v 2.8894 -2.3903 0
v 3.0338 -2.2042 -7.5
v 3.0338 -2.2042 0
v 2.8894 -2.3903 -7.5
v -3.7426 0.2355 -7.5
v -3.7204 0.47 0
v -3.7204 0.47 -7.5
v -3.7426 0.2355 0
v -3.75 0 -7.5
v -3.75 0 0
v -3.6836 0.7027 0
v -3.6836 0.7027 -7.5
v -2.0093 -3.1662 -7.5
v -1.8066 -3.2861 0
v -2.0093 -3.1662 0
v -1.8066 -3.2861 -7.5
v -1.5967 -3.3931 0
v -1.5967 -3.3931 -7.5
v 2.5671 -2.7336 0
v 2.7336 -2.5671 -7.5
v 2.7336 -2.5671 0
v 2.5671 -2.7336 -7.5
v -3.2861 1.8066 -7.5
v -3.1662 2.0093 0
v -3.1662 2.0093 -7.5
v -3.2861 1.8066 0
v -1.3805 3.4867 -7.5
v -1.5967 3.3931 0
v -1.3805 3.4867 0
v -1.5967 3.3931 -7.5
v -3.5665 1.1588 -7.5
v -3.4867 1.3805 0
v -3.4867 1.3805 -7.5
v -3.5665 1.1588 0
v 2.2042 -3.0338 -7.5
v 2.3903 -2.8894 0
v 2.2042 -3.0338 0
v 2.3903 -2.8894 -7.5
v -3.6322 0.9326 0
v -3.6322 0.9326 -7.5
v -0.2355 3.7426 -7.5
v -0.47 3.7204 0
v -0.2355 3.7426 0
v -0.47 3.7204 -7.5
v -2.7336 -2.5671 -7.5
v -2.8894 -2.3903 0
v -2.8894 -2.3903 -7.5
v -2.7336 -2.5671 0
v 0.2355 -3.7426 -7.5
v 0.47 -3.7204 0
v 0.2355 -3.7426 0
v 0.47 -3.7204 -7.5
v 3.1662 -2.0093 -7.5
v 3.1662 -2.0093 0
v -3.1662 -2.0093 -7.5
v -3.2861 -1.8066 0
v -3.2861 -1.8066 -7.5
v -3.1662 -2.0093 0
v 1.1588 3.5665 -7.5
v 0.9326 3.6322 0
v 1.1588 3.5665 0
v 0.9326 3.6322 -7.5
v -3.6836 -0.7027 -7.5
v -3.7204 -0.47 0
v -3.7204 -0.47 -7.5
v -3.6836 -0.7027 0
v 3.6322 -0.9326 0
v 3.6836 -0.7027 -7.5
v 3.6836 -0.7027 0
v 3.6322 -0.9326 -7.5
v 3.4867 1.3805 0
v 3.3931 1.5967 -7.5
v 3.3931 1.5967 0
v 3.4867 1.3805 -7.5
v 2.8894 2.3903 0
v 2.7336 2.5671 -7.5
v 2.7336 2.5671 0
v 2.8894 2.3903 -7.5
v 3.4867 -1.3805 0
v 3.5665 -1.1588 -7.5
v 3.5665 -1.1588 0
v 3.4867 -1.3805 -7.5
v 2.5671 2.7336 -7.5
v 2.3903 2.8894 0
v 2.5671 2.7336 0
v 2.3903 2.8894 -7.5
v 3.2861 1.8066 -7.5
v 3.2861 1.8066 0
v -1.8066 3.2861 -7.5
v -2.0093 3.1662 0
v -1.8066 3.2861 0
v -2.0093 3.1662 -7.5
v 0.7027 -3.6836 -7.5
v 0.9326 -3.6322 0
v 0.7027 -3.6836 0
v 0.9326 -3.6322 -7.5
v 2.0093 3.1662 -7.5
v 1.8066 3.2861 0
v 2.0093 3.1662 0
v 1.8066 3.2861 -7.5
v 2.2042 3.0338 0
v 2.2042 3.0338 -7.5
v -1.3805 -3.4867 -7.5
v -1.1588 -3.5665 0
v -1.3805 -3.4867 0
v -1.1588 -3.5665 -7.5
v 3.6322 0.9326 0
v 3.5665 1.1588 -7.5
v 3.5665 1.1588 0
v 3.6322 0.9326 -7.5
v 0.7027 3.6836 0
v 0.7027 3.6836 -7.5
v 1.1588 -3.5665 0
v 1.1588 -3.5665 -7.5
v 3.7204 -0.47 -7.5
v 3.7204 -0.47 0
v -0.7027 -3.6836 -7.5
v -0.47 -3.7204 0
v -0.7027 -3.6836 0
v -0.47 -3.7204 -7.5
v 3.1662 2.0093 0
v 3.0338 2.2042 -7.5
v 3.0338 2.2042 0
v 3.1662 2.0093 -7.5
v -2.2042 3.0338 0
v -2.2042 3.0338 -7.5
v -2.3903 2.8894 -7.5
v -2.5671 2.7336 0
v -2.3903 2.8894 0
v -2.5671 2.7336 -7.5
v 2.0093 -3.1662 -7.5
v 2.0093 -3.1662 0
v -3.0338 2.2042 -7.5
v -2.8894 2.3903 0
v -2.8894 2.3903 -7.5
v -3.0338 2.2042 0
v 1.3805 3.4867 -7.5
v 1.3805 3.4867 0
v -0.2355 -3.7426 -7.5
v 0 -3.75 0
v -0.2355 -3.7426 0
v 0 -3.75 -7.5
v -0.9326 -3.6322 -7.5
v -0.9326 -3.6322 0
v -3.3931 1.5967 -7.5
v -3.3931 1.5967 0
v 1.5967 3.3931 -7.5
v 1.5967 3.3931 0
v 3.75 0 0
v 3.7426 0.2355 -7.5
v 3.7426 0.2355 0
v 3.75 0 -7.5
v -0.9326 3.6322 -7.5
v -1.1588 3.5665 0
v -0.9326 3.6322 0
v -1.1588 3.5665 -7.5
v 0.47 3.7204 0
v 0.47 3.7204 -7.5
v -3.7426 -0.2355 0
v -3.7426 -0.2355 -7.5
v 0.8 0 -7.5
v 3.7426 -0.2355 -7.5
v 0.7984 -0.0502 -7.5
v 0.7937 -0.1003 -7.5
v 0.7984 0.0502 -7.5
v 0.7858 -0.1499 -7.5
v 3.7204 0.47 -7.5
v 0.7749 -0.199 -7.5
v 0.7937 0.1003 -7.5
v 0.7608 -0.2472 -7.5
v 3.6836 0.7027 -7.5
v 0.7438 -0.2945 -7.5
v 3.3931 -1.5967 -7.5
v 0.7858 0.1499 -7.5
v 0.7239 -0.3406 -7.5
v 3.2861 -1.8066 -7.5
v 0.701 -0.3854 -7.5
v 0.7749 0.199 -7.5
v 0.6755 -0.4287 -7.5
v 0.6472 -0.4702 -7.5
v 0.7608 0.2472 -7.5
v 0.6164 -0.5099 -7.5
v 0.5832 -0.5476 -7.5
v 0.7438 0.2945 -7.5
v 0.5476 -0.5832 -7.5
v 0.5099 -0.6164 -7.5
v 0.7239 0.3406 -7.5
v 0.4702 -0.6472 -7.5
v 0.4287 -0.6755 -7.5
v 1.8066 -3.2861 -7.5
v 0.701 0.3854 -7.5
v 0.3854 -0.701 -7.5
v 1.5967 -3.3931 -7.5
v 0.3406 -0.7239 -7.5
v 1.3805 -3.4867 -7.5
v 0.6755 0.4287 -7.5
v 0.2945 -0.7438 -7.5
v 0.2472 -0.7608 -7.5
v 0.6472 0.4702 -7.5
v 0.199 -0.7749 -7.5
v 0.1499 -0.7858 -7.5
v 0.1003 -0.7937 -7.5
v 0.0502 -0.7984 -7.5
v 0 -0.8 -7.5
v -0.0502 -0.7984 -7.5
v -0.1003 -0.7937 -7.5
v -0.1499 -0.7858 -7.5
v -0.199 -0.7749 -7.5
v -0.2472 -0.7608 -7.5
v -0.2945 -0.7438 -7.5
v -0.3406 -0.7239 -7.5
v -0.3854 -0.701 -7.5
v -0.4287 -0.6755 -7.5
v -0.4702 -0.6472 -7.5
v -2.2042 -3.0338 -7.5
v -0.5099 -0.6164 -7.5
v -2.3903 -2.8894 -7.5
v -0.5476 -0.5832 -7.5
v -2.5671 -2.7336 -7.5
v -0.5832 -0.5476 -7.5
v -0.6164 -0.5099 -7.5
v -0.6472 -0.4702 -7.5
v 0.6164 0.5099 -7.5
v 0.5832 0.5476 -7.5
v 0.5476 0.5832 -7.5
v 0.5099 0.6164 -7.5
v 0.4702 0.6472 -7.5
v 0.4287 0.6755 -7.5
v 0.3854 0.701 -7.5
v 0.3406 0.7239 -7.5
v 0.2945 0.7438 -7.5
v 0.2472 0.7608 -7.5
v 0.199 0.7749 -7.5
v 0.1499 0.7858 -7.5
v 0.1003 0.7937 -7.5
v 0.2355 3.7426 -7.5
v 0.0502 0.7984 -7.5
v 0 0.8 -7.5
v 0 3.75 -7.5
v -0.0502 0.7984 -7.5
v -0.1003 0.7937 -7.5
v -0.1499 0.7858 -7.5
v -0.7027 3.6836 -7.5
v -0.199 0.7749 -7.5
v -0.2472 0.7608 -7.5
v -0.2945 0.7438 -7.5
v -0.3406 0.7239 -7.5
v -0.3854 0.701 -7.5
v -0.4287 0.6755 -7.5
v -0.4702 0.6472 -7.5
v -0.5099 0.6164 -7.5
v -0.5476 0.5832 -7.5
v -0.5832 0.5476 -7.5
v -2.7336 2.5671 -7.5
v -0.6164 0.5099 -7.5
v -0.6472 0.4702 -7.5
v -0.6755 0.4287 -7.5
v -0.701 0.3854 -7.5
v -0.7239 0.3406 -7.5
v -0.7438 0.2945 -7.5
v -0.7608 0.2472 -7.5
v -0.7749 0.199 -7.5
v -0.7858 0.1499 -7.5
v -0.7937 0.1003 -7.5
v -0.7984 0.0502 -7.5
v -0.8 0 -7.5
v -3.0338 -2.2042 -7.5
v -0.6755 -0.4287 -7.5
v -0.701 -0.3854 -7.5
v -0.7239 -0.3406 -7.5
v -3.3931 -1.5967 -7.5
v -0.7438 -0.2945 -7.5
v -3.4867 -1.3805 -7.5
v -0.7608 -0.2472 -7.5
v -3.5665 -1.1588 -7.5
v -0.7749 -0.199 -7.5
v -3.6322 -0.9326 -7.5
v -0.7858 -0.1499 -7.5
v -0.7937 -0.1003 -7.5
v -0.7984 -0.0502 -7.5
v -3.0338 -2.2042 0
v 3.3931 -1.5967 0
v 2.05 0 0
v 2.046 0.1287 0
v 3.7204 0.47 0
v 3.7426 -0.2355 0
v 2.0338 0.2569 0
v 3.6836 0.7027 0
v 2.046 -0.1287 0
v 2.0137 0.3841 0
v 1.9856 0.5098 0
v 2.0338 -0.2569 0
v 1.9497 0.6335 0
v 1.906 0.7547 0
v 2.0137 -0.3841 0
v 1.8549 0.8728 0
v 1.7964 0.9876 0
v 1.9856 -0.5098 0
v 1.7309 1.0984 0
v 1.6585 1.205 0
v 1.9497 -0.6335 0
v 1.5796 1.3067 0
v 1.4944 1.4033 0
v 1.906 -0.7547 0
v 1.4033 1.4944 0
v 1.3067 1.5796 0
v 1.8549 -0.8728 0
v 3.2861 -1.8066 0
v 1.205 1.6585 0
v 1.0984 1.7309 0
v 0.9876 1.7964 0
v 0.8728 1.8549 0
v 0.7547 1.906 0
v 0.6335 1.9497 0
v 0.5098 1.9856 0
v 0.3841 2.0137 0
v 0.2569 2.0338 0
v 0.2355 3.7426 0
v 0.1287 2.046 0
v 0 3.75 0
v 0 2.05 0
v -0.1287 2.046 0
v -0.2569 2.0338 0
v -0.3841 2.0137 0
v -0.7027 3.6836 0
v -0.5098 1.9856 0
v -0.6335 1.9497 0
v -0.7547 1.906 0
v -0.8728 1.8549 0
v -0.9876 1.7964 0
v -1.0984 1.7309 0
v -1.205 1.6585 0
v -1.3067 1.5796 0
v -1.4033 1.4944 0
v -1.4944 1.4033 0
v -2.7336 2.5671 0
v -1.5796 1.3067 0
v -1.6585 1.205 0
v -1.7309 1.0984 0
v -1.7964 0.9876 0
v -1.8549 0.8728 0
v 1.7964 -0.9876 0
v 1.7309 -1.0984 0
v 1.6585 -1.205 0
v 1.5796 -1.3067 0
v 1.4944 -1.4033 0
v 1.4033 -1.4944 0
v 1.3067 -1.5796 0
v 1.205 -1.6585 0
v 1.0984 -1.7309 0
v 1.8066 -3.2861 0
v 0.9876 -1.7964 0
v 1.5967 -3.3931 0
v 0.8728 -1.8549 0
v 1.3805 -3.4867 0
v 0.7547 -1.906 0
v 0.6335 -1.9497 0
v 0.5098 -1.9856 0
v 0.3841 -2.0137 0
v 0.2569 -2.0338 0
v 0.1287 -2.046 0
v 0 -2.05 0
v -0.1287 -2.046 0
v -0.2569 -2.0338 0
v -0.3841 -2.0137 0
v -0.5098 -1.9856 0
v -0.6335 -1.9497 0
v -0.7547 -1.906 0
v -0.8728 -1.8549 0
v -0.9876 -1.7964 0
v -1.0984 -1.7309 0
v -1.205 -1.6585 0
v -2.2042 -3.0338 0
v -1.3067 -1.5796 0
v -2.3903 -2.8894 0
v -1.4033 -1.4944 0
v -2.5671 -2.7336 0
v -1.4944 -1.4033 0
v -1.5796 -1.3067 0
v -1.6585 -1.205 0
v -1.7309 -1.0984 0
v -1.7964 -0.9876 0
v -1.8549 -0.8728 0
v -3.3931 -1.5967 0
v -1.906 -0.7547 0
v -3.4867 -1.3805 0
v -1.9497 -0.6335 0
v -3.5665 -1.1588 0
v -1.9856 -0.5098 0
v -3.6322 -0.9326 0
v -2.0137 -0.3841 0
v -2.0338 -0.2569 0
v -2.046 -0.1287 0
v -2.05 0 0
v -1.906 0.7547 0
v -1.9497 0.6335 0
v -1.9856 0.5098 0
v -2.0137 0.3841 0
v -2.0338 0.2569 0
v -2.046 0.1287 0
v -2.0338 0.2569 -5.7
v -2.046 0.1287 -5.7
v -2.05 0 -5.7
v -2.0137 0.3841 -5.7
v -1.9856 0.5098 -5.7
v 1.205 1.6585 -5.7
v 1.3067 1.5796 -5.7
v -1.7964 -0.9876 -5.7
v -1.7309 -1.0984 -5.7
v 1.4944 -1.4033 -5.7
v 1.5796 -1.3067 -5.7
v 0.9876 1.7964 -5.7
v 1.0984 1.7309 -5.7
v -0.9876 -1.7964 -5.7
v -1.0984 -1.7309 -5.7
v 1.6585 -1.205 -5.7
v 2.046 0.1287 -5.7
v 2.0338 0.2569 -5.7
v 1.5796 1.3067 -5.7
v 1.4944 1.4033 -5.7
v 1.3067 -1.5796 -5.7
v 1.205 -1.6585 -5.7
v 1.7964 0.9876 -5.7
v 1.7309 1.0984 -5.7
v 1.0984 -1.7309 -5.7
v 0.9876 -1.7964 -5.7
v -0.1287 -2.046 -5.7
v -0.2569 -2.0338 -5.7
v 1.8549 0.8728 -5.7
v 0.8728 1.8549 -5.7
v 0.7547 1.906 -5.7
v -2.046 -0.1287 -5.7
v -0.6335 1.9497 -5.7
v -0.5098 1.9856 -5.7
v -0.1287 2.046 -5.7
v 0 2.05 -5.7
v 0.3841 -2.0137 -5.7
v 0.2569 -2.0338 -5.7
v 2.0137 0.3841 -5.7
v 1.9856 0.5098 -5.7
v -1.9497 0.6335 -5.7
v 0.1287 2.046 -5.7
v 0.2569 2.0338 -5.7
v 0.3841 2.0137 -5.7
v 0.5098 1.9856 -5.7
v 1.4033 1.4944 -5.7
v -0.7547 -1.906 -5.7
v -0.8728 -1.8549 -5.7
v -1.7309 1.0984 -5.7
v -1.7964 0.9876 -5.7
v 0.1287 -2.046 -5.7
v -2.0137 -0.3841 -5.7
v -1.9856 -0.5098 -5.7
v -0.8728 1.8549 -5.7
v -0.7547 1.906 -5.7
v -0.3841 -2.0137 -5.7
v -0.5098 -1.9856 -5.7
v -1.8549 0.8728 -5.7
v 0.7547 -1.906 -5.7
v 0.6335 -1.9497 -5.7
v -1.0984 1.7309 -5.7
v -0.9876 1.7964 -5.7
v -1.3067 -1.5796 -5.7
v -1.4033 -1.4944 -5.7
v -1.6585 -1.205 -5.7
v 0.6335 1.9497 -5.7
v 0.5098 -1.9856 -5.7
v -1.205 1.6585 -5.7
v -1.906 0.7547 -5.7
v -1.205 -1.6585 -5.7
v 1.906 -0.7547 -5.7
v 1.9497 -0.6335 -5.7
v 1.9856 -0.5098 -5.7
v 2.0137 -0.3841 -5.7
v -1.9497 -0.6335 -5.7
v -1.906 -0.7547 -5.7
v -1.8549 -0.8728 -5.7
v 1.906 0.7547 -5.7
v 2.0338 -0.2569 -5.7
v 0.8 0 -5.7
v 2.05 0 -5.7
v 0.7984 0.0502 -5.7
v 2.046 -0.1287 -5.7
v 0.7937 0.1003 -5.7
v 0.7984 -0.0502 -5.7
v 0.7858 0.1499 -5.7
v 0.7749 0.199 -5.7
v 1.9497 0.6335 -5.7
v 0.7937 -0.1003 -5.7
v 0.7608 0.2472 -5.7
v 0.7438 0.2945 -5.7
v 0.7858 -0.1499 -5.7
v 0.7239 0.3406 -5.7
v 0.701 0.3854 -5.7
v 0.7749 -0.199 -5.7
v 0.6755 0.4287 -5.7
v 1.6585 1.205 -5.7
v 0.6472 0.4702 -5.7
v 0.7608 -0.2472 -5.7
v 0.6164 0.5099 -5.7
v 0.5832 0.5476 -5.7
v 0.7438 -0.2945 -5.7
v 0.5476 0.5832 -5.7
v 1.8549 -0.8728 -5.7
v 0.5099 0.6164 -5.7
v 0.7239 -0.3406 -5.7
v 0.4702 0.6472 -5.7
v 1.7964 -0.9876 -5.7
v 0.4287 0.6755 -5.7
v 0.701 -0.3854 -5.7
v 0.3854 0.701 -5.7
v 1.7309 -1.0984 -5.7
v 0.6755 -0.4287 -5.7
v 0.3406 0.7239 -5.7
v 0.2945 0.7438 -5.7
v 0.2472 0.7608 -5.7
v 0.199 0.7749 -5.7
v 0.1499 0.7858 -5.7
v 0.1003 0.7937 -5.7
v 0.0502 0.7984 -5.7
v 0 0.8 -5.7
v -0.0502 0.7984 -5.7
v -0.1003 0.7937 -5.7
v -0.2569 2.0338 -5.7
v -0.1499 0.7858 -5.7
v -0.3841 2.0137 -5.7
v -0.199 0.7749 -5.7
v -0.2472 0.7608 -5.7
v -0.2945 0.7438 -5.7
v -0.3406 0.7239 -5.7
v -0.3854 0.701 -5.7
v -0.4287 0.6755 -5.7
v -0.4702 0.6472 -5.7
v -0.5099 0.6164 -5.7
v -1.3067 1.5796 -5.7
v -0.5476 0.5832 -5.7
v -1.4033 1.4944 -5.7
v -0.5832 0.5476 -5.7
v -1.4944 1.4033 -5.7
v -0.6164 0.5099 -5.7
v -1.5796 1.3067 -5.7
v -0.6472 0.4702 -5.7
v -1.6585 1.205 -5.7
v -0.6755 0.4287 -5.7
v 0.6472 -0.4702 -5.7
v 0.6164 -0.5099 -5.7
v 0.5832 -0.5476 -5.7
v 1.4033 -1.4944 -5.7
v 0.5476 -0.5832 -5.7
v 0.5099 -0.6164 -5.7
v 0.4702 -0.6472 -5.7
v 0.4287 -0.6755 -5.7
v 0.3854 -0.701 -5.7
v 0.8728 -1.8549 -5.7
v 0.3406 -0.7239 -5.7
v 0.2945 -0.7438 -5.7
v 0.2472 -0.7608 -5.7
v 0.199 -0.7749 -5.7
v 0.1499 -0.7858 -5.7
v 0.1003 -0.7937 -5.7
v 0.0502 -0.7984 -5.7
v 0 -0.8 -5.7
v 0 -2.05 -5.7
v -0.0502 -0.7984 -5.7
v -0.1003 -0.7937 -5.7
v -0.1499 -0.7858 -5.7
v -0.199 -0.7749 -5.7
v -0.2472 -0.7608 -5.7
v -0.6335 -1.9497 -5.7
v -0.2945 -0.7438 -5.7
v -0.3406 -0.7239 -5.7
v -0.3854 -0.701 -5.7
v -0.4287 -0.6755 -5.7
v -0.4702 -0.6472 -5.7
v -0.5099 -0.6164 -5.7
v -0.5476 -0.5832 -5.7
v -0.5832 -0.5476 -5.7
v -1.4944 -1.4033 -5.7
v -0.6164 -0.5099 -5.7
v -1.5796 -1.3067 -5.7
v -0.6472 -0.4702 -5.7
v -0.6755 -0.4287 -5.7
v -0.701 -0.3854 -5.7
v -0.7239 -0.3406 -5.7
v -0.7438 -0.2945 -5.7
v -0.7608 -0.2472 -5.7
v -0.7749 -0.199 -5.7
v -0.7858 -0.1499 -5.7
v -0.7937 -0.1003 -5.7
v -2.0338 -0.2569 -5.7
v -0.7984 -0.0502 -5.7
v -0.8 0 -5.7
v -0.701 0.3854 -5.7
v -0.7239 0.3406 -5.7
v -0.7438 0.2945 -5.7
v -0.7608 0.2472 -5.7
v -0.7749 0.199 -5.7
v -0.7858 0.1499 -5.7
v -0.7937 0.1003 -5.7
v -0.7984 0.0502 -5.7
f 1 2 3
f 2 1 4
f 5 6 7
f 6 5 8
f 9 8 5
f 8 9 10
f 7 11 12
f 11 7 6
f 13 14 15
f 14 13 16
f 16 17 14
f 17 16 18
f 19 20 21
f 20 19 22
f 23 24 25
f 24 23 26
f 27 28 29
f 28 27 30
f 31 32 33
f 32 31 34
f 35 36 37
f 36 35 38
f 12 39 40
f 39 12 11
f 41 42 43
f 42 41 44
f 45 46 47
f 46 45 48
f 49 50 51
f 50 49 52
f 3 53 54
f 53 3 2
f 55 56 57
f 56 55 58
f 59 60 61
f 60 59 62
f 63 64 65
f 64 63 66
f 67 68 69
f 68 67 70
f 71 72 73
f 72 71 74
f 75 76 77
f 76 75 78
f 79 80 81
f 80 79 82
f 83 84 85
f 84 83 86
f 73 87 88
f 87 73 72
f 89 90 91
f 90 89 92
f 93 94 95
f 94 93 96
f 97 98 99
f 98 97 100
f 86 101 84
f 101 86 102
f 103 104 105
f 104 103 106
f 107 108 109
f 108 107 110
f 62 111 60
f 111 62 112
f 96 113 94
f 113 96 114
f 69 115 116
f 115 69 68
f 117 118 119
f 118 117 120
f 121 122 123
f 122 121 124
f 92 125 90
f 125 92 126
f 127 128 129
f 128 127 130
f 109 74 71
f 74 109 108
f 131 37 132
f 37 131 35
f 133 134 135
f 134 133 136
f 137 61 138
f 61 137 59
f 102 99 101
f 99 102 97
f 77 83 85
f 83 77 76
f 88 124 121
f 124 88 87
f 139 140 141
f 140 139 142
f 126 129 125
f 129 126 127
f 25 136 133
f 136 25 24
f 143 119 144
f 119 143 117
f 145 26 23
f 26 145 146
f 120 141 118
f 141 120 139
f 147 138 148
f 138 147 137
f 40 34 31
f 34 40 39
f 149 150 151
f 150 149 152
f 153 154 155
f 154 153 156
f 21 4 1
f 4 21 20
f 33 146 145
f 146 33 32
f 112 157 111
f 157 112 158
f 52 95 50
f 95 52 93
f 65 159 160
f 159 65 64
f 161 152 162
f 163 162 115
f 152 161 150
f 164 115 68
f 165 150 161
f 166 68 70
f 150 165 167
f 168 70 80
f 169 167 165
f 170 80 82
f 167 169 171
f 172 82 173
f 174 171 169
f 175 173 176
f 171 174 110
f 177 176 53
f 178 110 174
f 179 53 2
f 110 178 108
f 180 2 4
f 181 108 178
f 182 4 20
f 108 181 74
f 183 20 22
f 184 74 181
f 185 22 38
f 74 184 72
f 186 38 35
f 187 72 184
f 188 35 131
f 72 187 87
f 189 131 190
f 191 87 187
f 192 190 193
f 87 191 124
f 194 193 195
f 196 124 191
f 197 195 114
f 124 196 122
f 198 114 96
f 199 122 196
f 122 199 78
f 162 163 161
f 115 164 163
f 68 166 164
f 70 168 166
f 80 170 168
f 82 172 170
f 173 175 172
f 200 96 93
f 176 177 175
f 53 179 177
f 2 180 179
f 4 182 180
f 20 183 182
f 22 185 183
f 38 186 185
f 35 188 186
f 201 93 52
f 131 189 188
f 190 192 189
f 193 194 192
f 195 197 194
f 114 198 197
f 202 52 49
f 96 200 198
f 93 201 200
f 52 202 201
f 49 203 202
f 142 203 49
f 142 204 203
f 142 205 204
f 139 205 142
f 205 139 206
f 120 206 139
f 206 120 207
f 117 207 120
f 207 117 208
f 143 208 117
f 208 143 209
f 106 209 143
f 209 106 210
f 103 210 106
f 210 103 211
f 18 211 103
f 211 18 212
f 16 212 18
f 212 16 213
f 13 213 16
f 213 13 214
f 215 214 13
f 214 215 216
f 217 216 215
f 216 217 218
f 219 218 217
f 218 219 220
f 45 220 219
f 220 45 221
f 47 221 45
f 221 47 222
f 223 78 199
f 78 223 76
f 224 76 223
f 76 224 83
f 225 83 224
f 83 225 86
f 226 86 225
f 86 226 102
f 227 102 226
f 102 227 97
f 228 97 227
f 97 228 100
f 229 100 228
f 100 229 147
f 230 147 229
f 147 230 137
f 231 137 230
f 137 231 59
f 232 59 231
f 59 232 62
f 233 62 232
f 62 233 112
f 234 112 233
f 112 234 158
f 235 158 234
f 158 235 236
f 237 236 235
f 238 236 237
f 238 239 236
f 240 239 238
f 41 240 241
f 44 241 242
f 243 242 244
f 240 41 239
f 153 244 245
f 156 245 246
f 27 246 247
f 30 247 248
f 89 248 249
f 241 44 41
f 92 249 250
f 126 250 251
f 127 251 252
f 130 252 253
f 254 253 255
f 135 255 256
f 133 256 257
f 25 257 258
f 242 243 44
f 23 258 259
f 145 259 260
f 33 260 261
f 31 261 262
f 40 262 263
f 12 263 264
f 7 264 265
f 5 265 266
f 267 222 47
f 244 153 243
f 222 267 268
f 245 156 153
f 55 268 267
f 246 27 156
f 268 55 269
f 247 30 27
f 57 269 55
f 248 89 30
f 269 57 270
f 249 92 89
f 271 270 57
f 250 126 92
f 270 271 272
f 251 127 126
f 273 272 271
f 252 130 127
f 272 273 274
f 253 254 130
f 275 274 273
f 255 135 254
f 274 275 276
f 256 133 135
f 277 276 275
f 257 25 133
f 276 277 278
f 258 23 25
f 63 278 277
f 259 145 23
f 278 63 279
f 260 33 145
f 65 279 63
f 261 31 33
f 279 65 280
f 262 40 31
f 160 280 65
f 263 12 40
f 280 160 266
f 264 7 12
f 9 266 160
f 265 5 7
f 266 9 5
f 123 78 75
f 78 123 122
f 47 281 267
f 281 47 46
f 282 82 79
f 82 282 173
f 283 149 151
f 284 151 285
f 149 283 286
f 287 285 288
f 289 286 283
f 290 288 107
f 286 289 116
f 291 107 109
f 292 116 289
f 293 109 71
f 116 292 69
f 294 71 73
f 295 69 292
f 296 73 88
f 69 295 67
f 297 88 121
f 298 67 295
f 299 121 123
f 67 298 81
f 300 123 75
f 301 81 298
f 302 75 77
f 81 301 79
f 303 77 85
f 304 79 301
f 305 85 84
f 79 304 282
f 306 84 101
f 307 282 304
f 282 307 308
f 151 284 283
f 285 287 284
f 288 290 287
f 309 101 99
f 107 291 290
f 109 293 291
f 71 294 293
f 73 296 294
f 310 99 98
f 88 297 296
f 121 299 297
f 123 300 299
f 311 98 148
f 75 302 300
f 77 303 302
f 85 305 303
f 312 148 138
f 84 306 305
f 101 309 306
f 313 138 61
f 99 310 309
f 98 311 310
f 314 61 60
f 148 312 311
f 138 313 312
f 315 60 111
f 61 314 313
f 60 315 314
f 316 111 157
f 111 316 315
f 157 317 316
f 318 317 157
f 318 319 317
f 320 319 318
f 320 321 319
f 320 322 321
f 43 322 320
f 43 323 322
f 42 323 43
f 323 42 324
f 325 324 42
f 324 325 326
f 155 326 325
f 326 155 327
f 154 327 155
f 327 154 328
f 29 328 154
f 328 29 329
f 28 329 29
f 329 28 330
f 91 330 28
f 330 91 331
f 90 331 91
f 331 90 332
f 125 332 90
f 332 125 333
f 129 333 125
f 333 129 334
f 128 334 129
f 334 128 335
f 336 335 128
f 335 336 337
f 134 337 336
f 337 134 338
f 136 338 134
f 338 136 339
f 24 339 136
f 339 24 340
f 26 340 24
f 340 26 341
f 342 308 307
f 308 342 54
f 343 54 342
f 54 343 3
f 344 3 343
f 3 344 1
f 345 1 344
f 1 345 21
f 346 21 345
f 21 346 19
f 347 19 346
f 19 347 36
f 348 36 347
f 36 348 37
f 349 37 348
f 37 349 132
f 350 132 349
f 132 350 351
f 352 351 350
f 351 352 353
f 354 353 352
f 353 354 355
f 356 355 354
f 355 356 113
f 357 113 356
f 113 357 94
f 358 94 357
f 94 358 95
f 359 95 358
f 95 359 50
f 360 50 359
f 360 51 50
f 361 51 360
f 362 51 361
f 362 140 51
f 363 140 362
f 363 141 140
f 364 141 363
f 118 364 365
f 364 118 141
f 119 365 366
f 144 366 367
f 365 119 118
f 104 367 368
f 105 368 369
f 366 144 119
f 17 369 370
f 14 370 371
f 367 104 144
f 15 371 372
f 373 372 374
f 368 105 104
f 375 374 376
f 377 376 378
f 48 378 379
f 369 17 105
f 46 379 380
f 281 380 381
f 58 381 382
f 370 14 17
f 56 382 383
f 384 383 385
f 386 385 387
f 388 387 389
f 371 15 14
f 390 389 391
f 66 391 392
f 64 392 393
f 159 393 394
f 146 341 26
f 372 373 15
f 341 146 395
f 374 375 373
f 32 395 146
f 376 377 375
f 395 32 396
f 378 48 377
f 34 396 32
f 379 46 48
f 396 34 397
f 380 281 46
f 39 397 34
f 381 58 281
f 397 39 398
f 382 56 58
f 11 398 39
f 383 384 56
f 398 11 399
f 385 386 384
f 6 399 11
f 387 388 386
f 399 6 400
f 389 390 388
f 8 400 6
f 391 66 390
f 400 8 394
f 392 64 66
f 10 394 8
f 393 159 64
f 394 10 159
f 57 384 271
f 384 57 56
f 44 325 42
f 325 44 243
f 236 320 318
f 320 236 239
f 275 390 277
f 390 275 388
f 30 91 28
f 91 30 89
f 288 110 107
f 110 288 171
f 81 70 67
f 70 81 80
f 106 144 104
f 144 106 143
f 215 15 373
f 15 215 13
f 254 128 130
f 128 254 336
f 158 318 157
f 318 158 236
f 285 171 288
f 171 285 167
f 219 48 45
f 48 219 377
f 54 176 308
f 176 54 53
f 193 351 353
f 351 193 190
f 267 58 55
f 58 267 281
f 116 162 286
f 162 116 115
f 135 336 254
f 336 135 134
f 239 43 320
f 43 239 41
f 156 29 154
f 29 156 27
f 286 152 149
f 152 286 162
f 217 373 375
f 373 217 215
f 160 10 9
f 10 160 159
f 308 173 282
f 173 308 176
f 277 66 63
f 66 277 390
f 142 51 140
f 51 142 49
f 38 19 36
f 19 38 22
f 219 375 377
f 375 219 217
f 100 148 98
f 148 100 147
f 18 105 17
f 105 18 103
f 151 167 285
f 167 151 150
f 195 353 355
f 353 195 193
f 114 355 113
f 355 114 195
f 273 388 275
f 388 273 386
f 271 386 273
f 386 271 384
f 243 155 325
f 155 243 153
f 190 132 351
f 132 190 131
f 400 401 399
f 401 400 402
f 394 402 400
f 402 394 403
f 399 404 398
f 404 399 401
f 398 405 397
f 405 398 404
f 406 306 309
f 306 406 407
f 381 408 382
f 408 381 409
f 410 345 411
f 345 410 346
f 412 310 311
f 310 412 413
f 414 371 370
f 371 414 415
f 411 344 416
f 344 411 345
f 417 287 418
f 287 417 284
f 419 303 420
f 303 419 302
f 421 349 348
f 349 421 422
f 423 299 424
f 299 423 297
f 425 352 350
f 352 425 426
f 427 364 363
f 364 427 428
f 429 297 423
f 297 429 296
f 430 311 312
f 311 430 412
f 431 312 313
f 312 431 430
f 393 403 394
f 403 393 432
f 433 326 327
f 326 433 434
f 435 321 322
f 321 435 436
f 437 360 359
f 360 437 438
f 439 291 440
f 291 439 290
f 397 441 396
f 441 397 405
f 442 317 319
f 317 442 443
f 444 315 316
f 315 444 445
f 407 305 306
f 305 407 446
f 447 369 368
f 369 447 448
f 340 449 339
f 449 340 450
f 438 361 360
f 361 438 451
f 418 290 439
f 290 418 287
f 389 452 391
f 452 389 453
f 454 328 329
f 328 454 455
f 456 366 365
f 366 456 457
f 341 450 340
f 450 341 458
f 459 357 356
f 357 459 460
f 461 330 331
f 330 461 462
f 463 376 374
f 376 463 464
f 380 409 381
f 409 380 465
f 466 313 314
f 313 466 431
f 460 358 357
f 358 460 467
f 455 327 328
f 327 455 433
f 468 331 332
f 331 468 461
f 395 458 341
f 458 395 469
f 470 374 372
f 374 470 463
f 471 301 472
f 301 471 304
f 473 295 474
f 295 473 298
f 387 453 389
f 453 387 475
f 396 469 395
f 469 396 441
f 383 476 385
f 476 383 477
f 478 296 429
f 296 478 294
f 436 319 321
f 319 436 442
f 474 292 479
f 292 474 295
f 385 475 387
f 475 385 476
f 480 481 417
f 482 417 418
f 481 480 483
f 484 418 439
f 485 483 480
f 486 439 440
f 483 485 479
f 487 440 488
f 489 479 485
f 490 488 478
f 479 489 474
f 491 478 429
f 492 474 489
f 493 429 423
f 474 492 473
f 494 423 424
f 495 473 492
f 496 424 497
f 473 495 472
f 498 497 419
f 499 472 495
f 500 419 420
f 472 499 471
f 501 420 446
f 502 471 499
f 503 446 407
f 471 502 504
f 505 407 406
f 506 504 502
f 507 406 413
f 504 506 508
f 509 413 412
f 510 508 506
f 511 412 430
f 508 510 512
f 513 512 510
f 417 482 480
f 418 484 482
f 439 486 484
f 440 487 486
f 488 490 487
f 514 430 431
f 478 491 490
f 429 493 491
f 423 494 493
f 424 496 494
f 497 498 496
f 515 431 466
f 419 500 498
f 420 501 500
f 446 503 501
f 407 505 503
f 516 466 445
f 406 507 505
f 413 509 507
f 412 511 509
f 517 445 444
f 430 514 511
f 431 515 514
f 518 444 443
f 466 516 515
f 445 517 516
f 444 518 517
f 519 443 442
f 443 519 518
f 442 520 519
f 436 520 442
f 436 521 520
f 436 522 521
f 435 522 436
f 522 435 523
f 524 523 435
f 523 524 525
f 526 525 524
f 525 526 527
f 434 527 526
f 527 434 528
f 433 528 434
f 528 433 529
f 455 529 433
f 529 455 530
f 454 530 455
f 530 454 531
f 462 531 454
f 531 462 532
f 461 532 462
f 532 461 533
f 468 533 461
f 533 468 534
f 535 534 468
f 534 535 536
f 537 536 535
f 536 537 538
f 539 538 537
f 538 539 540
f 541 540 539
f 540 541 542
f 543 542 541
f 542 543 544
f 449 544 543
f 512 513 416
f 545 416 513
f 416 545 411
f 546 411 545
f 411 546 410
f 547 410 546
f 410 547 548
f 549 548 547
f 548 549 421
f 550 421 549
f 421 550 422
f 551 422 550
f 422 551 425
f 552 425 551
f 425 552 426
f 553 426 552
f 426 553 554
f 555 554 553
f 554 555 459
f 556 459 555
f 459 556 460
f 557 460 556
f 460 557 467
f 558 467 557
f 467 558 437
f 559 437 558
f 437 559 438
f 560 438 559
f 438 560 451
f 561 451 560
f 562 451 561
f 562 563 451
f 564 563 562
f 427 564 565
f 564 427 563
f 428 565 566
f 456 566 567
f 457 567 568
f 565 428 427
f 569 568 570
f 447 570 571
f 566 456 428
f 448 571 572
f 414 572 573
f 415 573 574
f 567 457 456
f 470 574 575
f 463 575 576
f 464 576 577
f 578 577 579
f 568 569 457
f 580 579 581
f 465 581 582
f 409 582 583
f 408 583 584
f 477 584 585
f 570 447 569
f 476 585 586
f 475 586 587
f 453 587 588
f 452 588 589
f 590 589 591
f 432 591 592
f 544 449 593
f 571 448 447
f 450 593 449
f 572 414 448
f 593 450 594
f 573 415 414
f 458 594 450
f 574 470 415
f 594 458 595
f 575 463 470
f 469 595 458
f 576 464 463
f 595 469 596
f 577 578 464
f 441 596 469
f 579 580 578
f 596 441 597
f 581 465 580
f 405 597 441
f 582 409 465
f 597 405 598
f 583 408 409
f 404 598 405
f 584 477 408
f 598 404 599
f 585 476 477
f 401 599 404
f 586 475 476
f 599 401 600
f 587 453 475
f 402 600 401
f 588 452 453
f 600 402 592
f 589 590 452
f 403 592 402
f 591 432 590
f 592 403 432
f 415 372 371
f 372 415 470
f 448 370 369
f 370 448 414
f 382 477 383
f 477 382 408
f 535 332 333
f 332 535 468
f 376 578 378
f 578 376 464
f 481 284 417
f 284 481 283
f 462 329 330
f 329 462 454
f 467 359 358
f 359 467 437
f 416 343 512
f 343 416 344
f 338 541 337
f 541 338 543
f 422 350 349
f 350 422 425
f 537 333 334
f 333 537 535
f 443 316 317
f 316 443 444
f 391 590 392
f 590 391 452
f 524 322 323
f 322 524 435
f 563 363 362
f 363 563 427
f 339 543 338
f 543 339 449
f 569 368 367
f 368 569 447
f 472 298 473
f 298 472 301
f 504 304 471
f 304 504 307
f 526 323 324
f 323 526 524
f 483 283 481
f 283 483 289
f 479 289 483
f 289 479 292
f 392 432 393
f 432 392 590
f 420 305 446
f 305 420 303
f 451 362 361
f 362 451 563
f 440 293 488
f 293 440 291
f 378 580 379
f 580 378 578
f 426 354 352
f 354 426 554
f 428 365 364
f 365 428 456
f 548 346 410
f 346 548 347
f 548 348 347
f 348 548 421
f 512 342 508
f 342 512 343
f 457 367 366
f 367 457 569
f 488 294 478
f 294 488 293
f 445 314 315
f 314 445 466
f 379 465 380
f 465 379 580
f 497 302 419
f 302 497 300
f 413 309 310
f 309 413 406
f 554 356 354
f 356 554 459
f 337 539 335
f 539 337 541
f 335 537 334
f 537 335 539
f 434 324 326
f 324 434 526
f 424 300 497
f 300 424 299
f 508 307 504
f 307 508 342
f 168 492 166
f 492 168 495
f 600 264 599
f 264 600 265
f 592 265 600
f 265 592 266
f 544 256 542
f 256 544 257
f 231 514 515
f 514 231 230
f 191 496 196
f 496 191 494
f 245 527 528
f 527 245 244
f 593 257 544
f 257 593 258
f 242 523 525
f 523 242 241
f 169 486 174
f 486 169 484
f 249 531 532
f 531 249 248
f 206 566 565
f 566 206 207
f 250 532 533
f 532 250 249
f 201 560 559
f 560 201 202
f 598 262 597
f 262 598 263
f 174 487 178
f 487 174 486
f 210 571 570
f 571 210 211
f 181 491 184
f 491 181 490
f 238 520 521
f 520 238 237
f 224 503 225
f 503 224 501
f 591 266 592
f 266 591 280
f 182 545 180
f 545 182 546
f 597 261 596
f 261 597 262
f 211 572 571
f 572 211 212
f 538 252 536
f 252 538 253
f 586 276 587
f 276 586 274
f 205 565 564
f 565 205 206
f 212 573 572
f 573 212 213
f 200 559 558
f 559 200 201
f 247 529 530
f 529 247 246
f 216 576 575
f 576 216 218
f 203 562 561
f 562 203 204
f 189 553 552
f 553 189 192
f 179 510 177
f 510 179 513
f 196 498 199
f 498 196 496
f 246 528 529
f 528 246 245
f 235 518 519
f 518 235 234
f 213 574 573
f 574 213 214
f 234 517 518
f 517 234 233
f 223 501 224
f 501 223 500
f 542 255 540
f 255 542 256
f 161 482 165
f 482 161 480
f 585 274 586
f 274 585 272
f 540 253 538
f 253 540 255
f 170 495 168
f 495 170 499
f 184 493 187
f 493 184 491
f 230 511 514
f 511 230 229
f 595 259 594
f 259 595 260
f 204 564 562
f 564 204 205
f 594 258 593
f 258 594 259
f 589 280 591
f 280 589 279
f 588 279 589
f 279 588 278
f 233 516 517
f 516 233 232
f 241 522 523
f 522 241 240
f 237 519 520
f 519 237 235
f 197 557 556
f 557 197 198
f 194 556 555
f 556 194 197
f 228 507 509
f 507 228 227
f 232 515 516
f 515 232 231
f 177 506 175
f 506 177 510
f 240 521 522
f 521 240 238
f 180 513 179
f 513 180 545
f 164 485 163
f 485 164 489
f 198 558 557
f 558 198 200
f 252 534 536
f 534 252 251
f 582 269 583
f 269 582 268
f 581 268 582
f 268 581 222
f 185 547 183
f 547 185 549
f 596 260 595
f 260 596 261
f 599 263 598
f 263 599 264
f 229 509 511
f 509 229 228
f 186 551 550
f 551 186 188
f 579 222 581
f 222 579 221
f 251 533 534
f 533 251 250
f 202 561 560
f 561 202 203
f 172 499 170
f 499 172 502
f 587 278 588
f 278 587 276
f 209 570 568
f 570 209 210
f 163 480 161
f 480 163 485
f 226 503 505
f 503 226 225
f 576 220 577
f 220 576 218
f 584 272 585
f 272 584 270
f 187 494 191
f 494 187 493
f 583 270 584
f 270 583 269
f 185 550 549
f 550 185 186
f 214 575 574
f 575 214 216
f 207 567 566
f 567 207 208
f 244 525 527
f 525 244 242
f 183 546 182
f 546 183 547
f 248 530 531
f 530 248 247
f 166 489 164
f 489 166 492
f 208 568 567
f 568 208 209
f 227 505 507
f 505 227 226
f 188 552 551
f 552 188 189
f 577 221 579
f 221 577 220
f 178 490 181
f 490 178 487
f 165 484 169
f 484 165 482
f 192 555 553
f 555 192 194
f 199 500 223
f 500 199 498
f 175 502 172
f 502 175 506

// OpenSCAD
sqrt3 = 1.732;
pin_h = 9.45;
pin_l = 45;


module Star(points, outer, inner) {

	// polar to cartesian: radius/angle to x/y
	function x(r, a) = r * cos(a);
	function y(r, a) = r * sin(a);

	// angular width of each pie slice of the star
	increment = 360/points;

	union() {
		for (p = [0 : points-1]) {

			// outer is outer point p
			// inner is inner point following p
			// next is next outer point following p

			assign(	x_outer = x(outer, increment * p),
					y_outer = y(outer, increment * p),
					x_inner = x(inner, (increment * p) + (increment/2)),
					y_inner = y(inner, (increment * p) + (increment/2)),
					x_next  = x(outer, increment * (p+1)),
					y_next  = y(outer, increment * (p+1))) {
				polygon(points = [[x_outer, y_outer], [x_inner, y_inner], [x_next, y_next], [0, 0]], paths  = [[0, 1, 2, 3]]);
			}
		}
	}
}


module wheel_teeth(teeths, teeth_thick, inner, outer, height) {
    union() {
        for (p = [0 : teeths-1]) {
            rotate([0,0,p*360/teeths]) translate([-teeth_thick/2, 0, 0]) cube([teeth_thick, outer, height]);
        }
        cylinder (height, inner, inner, $fn=100);
    }
}

star_nodes = 20;
star_outer = 25/2;
star_inner = 21/2;
star_height = 10;

module pin() {
    difference() {
        union() {
            translate ([0, 0, 0]) union() {
                cylinder (pin_l, pin_h/sqrt3, pin_h/sqrt3, $fn=6);
                translate([0, 0, pin_l]) difference() {
                    sphere (9.45/2, $fn=100);
                    translate([0, 0, -5]) cube ([10,10,10], center=true);
                }
            }
//            translate ([0, 0, 0]) linear_extrude(height=star_height) Star(star_nodes, star_outer, star_inner);
        wheel_teeth (star_nodes, 1, star_inner, star_outer, star_height);
        }
        translate([0, 0, -0.2]) color ("red") difference() {
            cylinder (18, 2.7, 2.7, $fn=100);
            translate([-5, 2.3, -1]) cube ([10, 10, 20]);
        }
    }
}

hat_pin_l = 5.5+0.3;
hat_pin_phi = 4.1;
hat_pin_wall_thick = 1.7;
alpha_2 = 360/star_nodes/2;
hole_r = 0.8;

pick_h = star_outer - star_inner * cos(alpha_2);
pick_r = star_inner * sin(alpha_2);
module hat() {
    difference() {
        cylinder (hat_pin_l+hat_pin_wall_thick, hat_pin_phi/2+hat_pin_wall_thick, hat_pin_phi/2+hat_pin_wall_thick, $fn=100);
        translate([0,0,-0.1]) cylinder (hat_pin_l, hat_pin_phi/2, hat_pin_phi/2, $fn=100);

        translate([0,0,-0.1]) cylinder (2*hat_pin_l, hole_r, hole_r, $fn=100);
    }

}

*pin();
rotate ([0, 180, 0]) hat();
